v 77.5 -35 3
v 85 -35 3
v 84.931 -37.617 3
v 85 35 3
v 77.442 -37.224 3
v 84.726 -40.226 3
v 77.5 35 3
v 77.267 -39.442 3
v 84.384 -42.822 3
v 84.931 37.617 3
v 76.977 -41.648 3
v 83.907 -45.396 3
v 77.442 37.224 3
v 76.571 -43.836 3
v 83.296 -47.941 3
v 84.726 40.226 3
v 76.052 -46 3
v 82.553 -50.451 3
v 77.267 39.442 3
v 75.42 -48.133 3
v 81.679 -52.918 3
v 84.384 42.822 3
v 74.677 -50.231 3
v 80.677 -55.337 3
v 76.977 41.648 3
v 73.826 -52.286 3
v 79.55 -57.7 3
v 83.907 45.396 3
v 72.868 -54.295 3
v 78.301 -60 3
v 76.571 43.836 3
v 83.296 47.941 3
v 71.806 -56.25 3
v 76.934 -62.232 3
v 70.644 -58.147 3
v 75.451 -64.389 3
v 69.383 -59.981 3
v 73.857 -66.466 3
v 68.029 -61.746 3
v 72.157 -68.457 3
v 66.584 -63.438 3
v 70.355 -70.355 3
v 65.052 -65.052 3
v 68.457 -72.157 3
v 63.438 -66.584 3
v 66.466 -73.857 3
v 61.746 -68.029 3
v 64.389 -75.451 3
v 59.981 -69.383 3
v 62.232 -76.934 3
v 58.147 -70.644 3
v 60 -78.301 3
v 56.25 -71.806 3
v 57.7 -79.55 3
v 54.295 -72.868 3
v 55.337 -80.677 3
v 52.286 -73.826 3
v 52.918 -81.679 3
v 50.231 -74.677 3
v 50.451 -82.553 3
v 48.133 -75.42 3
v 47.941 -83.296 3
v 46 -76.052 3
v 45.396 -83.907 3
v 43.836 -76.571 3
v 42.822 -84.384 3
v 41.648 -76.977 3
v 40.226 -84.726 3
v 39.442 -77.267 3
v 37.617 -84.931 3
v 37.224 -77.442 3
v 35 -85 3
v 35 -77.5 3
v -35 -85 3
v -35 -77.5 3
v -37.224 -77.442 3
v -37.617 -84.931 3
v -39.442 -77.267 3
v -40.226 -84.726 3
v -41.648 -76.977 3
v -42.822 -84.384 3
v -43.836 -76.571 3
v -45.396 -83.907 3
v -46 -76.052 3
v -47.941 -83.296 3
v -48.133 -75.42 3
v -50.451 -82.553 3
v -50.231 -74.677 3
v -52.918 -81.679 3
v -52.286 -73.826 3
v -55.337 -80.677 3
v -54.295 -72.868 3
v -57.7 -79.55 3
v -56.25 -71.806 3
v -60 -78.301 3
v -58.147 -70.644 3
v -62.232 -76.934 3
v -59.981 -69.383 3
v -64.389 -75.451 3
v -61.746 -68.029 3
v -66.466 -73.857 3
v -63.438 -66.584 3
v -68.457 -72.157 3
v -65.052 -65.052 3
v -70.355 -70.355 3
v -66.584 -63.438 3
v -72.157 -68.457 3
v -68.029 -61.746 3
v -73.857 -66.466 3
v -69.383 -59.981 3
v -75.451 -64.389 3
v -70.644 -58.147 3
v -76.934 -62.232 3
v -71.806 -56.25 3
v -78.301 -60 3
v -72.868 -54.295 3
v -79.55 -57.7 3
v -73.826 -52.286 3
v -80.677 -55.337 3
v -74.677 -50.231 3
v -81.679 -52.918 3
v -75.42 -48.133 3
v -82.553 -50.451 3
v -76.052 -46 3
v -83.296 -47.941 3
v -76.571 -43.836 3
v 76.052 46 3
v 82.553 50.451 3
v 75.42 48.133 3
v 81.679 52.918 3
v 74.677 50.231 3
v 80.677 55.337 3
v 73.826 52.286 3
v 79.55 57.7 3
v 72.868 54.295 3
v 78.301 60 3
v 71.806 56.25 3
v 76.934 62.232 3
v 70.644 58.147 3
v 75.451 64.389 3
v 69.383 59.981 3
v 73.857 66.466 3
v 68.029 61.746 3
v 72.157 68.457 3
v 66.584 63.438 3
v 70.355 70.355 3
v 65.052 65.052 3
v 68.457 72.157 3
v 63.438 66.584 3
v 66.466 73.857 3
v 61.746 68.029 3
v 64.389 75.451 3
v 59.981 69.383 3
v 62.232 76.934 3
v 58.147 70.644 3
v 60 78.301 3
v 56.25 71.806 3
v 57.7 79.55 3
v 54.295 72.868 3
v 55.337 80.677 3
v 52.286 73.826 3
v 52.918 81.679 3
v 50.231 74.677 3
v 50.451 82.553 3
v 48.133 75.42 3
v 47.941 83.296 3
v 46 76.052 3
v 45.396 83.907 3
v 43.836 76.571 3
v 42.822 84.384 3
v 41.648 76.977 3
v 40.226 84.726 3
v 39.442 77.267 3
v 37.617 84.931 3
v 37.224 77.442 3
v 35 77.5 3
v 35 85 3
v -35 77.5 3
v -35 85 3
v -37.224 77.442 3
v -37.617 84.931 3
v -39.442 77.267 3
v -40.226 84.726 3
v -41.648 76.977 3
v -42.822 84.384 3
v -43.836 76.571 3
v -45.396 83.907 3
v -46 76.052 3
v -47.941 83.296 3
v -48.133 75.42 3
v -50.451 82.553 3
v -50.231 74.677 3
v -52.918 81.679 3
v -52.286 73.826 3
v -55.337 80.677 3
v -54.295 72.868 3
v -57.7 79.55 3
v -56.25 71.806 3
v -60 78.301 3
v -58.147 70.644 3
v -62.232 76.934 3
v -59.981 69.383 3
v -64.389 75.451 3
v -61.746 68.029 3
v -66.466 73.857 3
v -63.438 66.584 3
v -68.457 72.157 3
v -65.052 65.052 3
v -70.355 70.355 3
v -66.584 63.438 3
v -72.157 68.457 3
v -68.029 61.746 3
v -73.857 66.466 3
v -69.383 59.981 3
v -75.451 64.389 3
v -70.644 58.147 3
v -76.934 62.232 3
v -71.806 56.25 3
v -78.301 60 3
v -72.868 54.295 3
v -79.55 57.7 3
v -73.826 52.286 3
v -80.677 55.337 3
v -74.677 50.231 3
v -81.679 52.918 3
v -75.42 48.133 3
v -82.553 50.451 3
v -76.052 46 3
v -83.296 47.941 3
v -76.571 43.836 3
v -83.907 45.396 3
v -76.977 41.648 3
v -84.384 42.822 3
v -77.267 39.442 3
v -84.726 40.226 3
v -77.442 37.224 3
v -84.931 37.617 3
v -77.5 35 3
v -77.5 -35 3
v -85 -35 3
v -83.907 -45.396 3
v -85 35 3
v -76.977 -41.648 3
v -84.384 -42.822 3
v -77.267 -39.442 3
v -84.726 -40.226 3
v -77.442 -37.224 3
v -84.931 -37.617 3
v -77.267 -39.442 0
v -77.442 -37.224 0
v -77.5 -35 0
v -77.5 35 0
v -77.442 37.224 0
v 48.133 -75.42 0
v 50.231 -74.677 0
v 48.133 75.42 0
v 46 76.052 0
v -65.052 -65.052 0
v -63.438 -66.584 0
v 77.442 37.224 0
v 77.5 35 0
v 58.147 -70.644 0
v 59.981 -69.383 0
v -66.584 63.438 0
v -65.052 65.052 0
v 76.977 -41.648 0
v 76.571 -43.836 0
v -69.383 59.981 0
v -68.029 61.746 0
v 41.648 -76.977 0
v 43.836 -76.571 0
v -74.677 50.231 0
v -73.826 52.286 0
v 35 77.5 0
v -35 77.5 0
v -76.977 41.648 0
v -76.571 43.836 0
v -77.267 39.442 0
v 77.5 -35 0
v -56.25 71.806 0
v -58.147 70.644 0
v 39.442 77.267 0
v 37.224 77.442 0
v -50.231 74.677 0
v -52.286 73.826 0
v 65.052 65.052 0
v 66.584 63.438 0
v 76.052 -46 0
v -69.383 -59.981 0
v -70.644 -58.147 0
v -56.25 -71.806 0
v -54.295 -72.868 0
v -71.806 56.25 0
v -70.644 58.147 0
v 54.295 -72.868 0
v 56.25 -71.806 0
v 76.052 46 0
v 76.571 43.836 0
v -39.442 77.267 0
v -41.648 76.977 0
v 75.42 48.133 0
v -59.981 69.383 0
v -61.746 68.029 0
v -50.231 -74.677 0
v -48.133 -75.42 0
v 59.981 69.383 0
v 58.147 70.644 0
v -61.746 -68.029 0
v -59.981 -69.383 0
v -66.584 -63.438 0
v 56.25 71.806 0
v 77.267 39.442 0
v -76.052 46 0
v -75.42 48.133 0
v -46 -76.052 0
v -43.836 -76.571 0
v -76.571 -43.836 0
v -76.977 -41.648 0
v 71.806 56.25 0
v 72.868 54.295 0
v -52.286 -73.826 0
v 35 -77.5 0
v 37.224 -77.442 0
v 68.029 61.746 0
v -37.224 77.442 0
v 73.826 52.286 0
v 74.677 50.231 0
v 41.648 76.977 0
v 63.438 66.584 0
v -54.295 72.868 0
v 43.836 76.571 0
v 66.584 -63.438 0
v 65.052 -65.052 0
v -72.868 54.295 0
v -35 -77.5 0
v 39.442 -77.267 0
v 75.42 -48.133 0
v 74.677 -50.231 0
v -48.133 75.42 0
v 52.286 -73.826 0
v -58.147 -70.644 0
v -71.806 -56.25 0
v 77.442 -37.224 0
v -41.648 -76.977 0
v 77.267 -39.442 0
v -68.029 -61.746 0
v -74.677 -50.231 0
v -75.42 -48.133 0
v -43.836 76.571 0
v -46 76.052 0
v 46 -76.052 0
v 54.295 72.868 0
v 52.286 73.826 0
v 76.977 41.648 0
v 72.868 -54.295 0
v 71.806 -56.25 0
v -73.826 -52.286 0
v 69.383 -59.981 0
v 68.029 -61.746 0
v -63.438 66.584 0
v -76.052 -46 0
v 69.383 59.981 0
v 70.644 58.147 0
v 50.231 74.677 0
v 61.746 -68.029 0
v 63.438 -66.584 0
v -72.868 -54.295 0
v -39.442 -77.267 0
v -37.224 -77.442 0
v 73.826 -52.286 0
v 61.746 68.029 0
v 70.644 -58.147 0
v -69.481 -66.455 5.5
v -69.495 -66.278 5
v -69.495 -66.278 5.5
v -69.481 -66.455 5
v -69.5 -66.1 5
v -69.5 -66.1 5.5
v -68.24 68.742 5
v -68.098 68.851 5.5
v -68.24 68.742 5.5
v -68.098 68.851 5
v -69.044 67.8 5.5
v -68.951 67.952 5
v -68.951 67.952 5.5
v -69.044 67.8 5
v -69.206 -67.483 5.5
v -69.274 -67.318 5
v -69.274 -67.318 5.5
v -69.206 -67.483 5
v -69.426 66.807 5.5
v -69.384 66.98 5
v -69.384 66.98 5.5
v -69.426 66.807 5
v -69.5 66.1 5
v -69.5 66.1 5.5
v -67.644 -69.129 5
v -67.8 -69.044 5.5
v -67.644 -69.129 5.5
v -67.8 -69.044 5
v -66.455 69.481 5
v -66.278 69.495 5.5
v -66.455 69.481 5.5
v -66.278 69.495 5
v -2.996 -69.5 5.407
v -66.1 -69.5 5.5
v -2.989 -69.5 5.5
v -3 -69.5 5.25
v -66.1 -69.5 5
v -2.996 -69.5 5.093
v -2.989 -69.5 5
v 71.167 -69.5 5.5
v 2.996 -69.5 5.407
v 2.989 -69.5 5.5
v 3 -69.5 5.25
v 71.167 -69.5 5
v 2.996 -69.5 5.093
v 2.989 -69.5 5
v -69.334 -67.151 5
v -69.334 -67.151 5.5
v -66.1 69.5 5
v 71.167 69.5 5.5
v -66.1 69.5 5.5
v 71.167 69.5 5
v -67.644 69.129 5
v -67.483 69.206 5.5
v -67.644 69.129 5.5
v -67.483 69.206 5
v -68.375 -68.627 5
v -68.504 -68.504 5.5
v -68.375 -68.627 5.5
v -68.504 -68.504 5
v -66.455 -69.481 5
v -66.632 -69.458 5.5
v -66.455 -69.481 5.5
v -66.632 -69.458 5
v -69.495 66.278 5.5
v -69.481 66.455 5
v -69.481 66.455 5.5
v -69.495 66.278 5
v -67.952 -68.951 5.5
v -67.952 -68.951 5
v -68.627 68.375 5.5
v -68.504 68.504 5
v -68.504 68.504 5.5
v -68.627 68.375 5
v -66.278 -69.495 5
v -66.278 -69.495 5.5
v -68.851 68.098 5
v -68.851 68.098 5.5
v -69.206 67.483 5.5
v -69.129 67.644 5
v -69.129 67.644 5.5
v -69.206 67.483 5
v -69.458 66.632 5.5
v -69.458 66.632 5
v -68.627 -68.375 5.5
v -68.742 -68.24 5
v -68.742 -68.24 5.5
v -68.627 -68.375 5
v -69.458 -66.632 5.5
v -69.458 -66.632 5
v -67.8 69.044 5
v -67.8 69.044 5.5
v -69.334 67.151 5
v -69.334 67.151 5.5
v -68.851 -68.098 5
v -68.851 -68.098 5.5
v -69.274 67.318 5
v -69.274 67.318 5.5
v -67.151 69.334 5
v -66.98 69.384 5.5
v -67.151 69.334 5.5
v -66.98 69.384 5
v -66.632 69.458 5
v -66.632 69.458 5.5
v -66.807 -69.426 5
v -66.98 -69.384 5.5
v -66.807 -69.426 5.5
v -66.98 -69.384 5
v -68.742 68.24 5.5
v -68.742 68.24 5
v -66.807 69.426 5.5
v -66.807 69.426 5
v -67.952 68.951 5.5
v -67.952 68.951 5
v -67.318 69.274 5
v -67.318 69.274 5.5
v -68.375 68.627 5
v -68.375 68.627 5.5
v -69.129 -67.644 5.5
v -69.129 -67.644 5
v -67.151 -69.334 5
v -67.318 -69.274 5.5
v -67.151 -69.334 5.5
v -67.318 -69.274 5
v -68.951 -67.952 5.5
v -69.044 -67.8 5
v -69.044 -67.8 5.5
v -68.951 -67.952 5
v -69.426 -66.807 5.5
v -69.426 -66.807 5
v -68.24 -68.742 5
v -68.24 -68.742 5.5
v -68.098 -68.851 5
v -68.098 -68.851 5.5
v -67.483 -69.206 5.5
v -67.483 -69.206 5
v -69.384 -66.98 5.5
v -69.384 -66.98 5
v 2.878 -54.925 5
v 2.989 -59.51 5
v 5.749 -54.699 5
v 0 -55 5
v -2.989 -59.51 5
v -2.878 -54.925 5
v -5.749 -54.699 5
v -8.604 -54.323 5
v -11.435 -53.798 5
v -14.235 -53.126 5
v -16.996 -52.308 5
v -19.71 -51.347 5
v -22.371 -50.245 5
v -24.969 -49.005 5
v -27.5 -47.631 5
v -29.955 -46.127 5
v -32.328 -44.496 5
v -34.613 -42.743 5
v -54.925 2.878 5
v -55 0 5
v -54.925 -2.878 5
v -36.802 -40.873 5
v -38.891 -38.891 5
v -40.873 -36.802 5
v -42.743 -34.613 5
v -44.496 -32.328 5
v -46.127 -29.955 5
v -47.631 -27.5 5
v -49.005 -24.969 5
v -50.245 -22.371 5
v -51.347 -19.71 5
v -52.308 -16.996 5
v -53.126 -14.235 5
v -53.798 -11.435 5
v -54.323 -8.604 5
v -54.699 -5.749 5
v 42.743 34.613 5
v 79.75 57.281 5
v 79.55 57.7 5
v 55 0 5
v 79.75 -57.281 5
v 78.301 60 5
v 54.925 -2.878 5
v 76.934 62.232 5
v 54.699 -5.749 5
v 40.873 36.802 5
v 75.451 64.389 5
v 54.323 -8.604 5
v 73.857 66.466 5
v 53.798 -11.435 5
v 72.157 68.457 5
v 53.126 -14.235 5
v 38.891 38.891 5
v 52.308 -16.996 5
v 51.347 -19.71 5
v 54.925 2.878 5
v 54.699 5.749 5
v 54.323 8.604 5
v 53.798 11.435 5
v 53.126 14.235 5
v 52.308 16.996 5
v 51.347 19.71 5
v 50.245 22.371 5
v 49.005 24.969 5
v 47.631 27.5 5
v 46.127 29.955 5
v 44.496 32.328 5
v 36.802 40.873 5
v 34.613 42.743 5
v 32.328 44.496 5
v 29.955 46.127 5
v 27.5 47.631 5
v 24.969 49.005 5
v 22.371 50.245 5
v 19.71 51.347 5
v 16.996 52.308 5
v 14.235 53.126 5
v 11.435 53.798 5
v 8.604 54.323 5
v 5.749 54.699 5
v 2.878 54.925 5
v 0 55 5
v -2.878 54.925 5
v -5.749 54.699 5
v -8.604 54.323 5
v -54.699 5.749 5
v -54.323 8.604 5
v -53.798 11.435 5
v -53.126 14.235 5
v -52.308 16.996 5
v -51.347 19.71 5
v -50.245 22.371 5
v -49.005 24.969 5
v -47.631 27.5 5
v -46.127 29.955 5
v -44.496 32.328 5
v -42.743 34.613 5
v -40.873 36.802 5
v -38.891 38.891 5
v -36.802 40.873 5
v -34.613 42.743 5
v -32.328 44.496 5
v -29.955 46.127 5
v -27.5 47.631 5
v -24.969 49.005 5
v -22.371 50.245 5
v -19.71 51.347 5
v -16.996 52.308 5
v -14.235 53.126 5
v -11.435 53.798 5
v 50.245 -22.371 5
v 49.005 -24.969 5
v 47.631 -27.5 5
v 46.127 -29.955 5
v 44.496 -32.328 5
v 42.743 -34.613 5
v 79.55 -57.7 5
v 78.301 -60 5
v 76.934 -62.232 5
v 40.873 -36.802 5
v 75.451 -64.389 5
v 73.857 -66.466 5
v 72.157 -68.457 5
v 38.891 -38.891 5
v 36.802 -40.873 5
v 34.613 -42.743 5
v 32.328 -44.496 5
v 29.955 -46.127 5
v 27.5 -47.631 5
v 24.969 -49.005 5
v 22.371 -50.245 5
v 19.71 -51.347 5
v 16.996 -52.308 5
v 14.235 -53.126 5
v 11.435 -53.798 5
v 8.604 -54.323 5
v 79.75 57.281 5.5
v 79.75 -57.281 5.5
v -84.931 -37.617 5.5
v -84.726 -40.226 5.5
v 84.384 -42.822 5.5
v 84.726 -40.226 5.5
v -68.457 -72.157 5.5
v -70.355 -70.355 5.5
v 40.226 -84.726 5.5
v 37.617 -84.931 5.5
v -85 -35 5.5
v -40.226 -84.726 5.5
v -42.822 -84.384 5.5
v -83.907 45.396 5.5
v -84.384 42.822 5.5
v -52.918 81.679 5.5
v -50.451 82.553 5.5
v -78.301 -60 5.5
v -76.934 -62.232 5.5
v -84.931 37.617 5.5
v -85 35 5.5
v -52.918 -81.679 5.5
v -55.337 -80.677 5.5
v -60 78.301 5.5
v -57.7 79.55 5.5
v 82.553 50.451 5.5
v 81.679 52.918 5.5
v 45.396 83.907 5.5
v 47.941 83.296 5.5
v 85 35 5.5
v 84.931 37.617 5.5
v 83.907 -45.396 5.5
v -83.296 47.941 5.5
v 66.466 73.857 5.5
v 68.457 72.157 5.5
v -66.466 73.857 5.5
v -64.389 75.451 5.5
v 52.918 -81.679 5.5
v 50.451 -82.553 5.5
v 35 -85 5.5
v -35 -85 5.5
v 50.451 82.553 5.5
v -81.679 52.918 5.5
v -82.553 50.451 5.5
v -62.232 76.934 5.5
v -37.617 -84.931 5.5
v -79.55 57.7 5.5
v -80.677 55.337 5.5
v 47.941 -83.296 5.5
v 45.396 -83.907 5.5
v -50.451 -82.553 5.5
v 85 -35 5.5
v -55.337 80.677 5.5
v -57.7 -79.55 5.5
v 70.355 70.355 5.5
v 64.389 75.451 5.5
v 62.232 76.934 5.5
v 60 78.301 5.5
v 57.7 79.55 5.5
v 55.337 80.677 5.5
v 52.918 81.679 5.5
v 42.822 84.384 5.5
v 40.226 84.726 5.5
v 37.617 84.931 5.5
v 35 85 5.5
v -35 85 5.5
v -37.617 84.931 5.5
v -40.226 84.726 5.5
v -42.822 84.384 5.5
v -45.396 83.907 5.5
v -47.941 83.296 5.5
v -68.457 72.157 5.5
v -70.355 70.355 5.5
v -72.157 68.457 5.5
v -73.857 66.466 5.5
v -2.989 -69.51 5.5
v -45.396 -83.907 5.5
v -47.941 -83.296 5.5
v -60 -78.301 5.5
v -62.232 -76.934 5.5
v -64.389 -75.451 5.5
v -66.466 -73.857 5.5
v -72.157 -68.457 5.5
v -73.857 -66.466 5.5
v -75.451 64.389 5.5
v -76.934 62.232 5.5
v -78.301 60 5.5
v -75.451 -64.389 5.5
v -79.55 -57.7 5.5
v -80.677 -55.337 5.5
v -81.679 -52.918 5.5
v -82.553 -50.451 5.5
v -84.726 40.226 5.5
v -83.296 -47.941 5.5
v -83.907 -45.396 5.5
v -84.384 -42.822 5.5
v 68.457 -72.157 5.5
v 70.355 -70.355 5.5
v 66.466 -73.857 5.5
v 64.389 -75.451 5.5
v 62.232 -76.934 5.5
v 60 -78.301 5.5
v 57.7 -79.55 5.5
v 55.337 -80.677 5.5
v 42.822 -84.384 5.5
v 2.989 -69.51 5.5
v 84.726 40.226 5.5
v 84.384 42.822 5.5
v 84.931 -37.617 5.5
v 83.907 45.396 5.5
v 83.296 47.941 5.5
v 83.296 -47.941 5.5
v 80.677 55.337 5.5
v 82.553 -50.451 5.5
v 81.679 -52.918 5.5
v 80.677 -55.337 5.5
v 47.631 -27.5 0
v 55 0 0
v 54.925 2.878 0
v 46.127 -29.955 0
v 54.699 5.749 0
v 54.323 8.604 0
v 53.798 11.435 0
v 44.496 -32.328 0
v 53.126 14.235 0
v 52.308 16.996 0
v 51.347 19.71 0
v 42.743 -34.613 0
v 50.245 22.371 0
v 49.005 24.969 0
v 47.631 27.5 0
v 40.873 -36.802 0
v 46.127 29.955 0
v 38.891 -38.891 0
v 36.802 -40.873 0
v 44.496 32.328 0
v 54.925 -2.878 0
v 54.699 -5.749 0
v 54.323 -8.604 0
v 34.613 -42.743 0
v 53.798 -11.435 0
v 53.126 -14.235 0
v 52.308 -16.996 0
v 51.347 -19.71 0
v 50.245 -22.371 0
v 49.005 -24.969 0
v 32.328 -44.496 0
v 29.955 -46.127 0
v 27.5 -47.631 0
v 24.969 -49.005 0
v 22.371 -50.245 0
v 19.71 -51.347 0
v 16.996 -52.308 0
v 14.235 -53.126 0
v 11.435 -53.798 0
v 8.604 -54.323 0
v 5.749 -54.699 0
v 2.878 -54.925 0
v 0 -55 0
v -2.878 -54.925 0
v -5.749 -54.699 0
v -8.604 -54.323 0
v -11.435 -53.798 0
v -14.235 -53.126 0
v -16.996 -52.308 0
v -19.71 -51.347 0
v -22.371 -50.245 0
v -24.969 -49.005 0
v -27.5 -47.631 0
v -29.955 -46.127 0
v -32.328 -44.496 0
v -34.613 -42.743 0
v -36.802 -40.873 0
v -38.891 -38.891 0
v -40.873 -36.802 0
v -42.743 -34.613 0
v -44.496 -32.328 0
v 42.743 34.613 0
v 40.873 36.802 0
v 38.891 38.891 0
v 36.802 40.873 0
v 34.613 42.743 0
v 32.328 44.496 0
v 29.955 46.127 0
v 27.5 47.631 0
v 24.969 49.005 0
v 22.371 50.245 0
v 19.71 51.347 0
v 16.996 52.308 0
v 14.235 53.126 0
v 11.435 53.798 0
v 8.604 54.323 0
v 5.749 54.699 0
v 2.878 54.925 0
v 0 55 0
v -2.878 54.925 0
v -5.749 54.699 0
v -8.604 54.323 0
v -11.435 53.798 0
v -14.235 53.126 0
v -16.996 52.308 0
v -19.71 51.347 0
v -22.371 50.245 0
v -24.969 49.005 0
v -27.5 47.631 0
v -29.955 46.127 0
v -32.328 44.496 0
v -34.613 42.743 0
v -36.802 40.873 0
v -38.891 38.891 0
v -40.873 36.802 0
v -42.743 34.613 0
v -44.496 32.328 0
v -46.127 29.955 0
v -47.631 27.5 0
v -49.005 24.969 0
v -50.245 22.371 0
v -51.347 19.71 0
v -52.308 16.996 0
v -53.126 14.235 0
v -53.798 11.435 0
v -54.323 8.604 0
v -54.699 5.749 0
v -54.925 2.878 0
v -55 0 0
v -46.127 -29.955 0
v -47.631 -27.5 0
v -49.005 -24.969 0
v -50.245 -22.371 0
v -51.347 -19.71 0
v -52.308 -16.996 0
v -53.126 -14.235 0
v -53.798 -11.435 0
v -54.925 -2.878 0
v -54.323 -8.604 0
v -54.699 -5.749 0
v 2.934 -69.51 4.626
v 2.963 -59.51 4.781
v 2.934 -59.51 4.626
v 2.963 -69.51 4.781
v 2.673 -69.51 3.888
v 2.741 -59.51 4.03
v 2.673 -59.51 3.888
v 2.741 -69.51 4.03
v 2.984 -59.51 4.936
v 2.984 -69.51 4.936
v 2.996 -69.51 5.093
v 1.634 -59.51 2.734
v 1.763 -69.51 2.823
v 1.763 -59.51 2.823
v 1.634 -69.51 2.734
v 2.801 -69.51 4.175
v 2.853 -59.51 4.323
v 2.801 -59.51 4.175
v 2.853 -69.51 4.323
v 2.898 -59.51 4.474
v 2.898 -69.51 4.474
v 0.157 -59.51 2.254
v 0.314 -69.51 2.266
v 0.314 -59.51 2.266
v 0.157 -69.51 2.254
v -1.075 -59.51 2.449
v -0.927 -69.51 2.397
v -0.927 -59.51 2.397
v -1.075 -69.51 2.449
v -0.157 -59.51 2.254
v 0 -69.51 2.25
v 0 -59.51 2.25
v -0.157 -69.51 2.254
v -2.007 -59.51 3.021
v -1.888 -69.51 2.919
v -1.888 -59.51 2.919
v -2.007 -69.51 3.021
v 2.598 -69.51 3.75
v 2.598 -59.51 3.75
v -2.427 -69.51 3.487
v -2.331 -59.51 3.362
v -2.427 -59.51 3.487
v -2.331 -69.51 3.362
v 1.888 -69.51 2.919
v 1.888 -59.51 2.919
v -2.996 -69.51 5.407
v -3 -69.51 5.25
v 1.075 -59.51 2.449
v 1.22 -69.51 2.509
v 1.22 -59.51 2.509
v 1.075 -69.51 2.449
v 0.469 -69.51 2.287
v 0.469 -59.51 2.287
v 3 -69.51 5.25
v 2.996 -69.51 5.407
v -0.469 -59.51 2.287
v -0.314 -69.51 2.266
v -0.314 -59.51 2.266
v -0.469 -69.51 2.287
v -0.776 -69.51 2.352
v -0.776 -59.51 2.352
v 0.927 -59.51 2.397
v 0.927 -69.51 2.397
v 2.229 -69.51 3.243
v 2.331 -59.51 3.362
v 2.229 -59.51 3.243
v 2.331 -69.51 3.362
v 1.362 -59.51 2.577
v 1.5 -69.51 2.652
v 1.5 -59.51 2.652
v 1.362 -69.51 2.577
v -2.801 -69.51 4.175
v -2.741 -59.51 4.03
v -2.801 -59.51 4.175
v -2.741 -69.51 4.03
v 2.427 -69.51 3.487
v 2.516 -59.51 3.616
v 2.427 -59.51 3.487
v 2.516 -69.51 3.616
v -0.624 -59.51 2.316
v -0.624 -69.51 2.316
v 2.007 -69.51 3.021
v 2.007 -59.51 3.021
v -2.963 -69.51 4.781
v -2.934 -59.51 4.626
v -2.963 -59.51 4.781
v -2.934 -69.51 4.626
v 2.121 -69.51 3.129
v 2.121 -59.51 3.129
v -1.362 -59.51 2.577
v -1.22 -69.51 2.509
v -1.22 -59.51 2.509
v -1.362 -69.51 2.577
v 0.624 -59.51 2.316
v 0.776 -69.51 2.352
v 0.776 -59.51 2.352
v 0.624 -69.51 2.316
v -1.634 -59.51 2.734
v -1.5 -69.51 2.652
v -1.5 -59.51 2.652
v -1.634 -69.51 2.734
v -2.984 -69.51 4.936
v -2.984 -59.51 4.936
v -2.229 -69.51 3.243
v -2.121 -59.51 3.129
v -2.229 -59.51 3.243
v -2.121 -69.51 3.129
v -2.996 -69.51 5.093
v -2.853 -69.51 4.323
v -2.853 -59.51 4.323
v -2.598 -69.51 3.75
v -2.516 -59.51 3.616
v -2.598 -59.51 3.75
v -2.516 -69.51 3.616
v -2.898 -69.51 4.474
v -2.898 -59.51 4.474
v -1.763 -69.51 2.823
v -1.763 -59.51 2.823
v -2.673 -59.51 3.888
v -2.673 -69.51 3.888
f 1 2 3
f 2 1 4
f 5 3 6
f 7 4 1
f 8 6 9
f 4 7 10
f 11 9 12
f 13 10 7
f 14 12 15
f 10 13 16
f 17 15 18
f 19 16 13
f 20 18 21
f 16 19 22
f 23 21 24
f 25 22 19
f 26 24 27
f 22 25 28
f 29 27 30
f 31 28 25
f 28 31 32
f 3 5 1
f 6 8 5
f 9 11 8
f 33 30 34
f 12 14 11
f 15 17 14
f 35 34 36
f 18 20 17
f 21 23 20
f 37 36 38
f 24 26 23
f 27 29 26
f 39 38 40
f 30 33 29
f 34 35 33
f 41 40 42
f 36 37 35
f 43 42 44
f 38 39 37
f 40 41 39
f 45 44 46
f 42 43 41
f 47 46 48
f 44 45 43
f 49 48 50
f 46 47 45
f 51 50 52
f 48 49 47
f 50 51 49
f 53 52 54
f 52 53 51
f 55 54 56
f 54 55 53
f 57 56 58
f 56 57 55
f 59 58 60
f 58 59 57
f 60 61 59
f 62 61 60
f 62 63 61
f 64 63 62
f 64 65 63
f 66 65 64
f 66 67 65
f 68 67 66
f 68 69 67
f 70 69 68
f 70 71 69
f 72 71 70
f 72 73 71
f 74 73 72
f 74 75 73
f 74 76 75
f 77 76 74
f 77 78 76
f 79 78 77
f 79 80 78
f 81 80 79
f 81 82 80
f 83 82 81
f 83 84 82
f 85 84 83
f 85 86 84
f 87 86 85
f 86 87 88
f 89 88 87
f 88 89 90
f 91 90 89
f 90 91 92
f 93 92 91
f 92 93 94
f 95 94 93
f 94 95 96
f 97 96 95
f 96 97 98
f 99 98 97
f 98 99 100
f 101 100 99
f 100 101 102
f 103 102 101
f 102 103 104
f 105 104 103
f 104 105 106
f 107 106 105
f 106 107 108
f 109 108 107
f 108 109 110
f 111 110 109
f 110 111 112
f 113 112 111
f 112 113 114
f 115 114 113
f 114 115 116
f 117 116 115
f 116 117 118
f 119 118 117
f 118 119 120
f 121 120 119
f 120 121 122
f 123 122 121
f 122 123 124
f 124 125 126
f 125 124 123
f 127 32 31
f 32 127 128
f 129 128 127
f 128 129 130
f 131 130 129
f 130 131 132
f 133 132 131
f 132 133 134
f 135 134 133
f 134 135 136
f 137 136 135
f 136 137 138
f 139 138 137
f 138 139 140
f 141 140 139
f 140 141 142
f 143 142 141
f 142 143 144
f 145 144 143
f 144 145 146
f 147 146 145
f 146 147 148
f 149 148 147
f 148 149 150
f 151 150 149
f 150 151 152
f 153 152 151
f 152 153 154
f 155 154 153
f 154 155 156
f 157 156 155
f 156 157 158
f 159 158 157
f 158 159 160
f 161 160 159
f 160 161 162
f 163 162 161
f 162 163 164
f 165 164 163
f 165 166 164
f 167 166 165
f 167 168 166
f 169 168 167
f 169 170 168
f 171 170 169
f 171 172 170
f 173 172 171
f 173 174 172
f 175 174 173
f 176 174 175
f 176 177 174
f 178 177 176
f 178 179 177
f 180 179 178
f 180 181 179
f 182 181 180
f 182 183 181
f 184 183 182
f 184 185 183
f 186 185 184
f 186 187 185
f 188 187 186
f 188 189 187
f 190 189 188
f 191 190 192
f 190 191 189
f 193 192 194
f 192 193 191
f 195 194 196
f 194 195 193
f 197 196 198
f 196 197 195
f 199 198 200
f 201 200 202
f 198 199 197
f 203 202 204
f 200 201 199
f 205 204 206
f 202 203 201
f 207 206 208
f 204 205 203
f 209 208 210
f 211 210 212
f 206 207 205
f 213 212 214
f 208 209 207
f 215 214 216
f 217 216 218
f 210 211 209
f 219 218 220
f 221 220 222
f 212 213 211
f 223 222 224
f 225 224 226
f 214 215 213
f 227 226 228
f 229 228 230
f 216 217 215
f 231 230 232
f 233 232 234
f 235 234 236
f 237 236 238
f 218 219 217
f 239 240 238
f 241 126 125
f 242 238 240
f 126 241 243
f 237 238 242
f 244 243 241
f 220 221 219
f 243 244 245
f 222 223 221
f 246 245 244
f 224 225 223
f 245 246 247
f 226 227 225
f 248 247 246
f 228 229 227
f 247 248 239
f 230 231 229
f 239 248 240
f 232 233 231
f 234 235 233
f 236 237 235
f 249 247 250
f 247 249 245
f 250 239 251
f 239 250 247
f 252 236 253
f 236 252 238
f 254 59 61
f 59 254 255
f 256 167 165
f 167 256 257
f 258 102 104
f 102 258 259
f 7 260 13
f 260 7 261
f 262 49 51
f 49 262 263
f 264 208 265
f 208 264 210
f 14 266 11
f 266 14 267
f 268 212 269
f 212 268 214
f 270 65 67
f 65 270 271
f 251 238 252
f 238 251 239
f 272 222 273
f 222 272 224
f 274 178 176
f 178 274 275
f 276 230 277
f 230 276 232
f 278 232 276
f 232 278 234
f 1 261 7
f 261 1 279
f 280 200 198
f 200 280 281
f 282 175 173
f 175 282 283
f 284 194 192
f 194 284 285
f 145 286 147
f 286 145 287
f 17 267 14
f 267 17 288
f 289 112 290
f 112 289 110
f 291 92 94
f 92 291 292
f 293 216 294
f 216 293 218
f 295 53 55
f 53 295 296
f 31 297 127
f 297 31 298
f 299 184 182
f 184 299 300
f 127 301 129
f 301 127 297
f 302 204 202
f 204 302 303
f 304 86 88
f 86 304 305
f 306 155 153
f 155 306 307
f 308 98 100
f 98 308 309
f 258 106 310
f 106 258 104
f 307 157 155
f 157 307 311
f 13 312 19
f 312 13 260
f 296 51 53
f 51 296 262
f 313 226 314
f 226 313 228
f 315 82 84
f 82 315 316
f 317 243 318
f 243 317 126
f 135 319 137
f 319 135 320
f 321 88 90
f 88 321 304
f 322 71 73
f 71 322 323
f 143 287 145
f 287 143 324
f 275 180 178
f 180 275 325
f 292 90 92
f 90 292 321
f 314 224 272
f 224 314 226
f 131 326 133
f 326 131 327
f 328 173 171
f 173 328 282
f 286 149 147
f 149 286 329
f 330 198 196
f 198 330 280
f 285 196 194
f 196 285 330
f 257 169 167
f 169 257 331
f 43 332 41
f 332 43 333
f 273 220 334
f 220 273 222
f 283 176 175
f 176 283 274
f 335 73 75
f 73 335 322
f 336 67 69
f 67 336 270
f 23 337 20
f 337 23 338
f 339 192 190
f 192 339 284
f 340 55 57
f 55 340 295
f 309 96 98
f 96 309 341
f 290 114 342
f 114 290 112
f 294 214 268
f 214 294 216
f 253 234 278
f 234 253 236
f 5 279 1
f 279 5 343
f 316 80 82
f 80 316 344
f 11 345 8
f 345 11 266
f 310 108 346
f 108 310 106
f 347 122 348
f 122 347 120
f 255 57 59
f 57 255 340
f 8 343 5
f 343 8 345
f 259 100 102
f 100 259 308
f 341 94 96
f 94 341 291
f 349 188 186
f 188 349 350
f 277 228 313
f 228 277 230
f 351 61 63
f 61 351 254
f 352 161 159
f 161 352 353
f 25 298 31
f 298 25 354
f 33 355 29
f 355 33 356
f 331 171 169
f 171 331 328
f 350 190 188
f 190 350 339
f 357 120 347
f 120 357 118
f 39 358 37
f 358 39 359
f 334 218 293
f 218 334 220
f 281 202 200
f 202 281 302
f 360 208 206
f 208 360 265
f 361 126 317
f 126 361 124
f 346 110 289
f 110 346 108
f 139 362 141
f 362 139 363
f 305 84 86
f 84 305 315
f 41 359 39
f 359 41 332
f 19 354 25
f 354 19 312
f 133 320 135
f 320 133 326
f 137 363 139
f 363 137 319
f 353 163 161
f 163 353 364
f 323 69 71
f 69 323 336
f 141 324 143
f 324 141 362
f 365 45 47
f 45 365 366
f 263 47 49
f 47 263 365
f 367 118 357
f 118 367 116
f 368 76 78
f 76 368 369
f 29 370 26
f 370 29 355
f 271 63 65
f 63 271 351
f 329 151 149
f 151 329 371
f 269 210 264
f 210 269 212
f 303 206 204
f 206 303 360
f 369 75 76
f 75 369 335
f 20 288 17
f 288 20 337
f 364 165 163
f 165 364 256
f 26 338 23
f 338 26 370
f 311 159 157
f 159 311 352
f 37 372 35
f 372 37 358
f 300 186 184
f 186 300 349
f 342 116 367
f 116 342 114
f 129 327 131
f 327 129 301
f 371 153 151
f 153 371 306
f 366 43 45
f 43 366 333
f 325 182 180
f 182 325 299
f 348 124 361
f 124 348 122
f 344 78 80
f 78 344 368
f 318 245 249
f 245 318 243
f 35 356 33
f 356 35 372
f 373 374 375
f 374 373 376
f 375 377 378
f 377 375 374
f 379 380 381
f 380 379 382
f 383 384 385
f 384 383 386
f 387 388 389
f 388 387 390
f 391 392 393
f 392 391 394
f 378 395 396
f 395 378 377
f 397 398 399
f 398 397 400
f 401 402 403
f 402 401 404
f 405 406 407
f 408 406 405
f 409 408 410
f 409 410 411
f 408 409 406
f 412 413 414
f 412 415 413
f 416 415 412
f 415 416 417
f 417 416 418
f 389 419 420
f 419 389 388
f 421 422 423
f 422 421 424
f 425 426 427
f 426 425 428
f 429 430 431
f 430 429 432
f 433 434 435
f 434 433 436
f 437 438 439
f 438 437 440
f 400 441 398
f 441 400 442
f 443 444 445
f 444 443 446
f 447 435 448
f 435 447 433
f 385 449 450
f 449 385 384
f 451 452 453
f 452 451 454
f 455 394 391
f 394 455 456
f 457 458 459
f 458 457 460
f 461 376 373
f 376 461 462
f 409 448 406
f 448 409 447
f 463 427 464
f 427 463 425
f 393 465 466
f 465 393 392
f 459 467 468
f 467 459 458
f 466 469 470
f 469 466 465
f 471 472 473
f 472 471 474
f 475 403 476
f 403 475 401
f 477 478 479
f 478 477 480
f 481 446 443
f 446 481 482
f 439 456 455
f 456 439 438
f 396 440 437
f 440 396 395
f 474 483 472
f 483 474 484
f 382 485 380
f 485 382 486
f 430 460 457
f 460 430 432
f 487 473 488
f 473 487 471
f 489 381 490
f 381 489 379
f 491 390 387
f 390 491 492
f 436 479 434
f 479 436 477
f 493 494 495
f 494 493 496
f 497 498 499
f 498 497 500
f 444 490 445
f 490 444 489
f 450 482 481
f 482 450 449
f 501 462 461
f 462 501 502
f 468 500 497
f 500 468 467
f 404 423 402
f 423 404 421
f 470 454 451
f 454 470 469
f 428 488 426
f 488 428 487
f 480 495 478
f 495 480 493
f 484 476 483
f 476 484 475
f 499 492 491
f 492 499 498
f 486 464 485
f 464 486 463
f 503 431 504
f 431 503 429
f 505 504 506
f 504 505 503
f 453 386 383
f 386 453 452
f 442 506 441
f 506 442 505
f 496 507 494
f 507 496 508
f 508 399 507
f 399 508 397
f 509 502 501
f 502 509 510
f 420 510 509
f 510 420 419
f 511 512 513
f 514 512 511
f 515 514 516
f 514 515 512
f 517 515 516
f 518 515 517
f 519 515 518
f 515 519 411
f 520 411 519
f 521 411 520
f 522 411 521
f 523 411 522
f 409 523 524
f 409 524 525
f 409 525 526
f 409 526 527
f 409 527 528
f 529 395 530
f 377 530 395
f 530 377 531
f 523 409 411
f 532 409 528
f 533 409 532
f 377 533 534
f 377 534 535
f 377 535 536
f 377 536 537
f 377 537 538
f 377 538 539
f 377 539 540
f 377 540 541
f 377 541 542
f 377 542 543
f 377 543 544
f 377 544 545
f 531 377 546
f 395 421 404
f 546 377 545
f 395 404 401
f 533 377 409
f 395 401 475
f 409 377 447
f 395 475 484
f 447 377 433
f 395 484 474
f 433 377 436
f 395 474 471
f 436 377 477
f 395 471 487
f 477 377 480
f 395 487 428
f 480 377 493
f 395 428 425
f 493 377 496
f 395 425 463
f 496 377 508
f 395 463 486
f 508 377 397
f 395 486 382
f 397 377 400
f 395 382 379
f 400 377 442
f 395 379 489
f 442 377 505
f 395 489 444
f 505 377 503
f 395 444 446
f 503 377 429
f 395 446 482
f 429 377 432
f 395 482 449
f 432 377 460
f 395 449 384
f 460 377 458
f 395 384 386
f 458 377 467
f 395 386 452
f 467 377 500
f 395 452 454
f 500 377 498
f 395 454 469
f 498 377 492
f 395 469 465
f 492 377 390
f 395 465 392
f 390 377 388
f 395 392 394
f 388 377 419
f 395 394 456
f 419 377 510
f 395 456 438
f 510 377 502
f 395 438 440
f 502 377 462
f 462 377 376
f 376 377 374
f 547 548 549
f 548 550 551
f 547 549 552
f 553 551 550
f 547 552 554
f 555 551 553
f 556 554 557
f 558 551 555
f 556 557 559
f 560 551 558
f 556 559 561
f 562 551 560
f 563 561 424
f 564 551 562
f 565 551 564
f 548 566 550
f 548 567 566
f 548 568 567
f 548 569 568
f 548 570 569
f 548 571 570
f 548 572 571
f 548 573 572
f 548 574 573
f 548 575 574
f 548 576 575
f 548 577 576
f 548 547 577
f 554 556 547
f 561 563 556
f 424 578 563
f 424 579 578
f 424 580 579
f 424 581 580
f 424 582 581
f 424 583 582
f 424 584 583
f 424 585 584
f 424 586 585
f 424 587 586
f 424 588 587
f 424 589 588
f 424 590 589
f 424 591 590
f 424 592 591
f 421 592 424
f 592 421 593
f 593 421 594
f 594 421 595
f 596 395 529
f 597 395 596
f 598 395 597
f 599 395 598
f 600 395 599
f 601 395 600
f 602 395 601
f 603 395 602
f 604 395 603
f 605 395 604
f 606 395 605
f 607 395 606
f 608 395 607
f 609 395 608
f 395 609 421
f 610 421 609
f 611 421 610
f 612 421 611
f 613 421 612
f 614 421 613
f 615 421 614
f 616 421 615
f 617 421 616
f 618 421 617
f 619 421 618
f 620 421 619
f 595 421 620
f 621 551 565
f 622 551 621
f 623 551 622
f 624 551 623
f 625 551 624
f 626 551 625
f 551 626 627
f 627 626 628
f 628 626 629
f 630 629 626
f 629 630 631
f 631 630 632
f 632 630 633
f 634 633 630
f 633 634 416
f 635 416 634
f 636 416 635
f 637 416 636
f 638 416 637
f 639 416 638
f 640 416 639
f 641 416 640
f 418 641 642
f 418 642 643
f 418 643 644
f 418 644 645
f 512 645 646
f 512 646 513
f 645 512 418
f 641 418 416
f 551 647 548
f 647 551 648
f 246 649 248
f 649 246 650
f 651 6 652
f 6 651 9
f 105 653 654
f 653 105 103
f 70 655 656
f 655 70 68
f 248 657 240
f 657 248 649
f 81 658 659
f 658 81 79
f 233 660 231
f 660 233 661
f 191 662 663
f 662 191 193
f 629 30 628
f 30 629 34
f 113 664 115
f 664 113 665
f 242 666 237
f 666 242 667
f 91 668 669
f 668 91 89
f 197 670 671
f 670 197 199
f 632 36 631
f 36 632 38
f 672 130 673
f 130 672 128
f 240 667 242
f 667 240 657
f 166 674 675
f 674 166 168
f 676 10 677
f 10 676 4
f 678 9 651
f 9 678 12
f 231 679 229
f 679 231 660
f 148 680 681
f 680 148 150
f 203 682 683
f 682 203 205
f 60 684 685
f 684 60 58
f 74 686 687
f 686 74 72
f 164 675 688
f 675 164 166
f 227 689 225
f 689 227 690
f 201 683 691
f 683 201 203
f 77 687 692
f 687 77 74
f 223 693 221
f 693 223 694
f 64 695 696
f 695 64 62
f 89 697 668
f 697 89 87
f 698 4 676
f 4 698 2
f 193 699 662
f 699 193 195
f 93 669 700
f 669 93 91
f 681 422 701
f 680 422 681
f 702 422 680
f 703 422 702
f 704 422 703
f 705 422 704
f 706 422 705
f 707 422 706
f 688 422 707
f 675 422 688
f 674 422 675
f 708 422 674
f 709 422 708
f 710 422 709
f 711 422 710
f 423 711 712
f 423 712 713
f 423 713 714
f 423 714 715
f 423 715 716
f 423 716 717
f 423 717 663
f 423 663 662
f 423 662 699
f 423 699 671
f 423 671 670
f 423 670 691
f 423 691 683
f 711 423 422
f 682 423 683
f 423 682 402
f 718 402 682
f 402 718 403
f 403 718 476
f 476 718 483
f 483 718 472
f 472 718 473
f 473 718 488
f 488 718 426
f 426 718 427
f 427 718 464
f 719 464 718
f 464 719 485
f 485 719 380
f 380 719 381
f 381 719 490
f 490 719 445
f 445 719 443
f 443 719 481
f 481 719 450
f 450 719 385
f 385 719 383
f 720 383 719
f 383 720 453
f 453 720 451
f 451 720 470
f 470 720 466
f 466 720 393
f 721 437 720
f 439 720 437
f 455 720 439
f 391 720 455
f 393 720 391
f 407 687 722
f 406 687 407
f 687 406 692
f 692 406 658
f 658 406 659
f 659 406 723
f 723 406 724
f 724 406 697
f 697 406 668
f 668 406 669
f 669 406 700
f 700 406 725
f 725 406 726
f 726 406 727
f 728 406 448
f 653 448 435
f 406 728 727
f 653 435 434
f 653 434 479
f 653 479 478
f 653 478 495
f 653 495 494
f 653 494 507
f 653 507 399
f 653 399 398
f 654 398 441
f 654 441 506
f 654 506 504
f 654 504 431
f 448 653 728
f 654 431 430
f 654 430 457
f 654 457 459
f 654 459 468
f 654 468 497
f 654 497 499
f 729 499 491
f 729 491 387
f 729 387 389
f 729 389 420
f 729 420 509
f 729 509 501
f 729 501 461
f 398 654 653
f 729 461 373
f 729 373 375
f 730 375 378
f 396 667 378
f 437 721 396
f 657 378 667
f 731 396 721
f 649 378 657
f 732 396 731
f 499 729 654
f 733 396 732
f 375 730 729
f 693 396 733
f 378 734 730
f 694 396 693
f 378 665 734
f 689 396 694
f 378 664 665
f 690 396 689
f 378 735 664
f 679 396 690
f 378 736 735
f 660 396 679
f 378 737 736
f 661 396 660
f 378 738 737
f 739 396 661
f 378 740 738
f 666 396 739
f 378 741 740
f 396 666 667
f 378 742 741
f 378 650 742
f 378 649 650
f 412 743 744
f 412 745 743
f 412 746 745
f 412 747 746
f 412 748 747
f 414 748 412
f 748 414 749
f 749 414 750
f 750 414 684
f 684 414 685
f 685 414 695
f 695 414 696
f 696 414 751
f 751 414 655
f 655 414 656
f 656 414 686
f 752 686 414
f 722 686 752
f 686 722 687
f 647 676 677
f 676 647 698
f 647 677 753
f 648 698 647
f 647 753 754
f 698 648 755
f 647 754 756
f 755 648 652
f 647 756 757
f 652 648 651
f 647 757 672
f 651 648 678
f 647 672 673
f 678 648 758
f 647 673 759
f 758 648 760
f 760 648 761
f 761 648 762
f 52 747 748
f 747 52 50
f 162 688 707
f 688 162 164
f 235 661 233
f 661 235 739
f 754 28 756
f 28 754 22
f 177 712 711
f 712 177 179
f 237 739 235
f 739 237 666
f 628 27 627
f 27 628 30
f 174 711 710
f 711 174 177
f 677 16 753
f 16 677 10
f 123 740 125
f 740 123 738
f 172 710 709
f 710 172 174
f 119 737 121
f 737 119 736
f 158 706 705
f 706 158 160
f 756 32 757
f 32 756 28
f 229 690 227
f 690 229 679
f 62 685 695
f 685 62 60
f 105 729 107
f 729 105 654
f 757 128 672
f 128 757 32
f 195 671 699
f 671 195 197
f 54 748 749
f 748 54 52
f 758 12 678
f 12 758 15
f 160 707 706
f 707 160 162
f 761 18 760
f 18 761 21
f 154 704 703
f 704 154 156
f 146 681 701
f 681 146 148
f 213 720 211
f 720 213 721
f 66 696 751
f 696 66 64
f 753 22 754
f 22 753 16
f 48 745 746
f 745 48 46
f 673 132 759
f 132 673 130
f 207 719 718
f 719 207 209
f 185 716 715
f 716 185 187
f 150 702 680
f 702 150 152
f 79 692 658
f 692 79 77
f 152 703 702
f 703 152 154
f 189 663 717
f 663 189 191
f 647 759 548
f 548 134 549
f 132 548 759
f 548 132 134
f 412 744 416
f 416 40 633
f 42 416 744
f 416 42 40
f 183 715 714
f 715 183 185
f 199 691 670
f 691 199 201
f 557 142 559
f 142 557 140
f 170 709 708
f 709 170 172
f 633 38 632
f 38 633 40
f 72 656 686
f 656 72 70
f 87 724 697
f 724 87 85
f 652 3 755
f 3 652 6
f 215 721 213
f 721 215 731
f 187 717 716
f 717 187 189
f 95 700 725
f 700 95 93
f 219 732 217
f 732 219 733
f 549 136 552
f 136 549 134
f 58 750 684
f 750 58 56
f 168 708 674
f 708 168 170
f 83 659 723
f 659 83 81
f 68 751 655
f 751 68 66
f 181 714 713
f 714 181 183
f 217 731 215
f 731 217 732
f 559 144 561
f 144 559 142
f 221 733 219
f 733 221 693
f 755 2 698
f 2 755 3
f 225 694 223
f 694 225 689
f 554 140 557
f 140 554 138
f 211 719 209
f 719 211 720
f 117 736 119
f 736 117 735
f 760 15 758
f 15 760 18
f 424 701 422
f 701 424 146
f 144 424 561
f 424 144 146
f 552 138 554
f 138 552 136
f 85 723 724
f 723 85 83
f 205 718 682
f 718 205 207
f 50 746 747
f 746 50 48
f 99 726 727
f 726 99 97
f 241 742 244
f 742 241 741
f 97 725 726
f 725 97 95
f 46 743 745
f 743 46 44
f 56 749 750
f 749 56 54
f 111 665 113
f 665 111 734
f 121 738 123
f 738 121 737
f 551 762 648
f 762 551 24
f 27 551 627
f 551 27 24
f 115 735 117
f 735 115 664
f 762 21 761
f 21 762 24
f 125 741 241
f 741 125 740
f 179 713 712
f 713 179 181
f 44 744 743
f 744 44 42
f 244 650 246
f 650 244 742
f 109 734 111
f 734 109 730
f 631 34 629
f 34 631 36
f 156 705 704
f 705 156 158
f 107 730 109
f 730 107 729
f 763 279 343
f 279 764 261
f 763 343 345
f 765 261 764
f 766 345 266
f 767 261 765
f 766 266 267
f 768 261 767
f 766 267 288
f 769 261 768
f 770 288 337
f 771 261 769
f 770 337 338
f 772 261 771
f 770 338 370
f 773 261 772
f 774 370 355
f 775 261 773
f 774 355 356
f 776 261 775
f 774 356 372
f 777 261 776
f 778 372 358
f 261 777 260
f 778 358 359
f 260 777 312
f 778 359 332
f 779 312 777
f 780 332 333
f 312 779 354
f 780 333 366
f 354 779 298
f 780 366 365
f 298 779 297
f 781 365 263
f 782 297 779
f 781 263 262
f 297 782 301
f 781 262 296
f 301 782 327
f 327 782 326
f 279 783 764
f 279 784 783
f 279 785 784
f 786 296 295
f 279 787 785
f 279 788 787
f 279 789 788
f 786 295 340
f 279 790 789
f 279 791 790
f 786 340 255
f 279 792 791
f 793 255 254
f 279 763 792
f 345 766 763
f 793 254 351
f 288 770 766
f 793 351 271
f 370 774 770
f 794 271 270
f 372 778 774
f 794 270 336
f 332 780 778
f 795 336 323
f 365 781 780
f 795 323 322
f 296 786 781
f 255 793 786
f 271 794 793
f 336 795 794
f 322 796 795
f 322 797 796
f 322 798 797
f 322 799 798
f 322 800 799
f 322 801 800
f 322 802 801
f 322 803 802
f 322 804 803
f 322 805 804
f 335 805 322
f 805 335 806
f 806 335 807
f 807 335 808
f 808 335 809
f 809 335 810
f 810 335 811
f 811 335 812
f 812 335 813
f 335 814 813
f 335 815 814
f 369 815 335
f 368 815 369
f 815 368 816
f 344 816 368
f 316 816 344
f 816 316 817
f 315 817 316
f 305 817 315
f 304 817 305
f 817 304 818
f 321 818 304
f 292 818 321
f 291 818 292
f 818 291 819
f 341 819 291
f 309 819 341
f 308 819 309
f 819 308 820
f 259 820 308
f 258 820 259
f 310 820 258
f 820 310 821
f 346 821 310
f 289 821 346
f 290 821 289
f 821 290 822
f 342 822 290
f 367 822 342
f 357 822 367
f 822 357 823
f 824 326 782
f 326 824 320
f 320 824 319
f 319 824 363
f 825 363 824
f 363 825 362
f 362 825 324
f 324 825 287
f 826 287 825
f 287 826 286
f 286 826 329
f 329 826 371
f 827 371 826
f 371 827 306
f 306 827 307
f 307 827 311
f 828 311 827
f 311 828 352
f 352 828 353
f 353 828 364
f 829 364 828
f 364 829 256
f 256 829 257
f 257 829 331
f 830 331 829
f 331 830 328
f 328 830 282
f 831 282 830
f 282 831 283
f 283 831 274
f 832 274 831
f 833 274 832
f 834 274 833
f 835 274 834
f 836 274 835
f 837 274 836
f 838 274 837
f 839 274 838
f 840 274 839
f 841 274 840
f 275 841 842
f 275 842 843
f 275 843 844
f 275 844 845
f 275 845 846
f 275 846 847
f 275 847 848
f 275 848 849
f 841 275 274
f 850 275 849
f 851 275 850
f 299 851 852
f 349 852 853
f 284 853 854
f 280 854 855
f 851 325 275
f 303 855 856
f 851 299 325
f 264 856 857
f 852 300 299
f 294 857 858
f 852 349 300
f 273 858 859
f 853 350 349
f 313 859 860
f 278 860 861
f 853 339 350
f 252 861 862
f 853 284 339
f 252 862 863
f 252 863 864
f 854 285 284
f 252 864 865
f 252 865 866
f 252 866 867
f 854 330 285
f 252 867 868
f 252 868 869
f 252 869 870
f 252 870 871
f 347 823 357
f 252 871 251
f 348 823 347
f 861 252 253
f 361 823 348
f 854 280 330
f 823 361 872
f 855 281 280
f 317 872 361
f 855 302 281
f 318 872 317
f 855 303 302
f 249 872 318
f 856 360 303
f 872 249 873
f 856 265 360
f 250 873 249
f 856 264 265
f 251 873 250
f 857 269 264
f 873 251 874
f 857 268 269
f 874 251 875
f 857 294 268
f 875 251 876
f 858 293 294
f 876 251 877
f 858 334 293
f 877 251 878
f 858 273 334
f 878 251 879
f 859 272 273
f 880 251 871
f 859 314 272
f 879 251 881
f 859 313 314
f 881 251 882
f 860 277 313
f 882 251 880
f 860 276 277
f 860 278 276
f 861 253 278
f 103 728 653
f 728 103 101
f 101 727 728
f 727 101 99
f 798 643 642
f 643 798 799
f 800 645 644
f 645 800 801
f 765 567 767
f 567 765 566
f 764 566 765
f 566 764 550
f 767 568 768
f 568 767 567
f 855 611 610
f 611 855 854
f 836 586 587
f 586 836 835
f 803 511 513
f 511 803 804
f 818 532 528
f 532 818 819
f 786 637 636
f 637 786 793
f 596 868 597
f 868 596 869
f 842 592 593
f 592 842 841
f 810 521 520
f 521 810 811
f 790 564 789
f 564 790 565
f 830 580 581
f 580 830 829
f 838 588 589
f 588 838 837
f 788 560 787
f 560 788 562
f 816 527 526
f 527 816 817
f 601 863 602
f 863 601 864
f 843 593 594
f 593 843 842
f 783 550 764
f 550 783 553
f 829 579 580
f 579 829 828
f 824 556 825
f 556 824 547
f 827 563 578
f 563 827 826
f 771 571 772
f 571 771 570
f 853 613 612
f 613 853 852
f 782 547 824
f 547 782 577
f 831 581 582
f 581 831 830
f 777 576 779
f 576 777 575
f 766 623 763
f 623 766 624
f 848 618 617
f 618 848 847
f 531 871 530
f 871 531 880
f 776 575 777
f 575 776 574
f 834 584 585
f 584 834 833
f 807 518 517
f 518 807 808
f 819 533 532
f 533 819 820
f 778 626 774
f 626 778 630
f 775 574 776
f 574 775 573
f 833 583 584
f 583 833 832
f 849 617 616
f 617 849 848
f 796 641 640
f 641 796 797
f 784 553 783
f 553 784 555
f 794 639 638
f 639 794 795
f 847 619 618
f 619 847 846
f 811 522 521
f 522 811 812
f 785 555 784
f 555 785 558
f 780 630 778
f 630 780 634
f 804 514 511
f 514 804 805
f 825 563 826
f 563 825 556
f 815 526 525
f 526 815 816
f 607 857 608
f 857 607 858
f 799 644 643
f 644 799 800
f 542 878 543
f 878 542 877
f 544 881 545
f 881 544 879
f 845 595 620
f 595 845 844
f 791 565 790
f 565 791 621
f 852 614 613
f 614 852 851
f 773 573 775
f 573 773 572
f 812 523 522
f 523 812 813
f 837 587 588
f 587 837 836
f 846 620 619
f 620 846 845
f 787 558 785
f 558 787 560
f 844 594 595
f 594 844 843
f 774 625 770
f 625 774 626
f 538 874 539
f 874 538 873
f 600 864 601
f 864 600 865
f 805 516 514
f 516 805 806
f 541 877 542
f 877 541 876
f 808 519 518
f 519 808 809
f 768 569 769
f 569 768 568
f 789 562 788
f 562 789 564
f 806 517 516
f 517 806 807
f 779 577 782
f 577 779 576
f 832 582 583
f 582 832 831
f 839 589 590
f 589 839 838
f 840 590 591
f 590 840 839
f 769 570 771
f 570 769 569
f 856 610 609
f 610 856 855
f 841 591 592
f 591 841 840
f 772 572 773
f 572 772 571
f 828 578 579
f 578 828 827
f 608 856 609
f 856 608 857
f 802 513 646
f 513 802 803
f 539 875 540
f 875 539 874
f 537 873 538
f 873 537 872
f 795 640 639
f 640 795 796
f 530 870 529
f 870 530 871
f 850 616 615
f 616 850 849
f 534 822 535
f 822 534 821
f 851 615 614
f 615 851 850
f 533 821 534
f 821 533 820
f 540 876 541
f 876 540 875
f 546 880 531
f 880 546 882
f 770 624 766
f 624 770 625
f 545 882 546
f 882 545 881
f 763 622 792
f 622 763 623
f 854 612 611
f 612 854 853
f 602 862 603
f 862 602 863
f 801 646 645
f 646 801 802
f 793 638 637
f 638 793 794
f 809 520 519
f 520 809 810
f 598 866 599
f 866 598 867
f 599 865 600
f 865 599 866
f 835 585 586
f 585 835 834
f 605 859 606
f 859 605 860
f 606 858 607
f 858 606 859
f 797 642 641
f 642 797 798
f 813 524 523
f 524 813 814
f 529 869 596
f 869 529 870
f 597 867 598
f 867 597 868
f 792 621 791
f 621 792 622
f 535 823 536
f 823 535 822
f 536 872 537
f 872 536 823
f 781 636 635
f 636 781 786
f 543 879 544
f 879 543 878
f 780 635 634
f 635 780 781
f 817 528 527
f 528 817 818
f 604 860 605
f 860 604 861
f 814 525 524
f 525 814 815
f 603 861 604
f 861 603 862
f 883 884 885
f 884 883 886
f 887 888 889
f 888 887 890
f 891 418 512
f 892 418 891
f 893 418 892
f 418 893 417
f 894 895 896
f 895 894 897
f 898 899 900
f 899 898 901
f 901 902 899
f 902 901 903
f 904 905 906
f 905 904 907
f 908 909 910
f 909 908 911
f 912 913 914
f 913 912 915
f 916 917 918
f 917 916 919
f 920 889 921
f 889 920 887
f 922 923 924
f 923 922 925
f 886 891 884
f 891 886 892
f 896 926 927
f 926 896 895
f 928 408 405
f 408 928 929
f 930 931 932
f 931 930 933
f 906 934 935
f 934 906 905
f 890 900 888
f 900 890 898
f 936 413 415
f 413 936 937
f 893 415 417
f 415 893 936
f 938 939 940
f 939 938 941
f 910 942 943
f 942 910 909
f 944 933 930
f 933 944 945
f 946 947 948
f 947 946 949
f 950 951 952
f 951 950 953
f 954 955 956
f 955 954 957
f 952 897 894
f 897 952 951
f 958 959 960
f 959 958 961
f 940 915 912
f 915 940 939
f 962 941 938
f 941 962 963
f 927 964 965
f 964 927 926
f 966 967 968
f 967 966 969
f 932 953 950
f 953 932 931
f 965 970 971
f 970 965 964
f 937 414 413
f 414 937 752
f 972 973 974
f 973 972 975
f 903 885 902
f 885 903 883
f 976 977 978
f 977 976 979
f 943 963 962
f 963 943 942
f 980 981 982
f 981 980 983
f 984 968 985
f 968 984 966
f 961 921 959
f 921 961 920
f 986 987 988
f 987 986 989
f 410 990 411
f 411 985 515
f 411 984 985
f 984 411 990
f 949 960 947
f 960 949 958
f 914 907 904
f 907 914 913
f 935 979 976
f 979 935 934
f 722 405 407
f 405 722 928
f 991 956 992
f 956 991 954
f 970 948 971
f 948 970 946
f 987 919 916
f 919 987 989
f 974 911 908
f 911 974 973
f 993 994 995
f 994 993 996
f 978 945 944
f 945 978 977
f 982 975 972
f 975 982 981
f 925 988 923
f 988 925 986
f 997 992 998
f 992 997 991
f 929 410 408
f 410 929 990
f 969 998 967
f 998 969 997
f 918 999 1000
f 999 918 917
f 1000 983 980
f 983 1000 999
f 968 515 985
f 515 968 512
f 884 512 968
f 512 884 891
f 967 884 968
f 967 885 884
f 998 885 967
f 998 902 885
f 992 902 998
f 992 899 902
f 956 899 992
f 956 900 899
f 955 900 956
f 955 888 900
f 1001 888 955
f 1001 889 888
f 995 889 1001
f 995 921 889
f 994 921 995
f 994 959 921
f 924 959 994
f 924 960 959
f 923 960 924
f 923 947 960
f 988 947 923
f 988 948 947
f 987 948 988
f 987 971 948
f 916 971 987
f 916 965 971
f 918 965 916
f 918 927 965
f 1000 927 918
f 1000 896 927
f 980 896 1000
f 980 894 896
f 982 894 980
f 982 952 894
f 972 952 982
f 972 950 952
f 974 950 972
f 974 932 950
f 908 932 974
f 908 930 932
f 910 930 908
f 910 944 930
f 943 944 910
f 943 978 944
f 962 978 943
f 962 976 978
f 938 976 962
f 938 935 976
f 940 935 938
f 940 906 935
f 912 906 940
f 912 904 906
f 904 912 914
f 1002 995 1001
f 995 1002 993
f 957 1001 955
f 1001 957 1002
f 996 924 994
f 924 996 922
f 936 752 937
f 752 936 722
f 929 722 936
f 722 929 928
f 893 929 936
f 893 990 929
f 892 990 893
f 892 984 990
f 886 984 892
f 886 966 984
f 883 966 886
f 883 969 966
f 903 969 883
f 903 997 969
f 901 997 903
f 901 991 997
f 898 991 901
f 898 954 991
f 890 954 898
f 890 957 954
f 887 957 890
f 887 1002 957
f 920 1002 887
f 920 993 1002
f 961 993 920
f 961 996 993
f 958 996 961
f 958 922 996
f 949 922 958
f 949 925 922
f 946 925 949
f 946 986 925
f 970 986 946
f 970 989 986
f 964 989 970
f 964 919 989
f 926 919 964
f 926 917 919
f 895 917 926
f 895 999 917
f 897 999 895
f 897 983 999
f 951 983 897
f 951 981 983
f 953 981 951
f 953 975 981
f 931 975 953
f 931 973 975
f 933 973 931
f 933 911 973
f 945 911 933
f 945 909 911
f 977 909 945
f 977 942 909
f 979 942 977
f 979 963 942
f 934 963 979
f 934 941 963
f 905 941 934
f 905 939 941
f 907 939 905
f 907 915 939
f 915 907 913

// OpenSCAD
// Fatif DS 20x25 Adapter Lensboard
// Accepts 138.5mm Gowland 8x10 lensboards via horizontal slide
// 
// Design: Terry Moore / Claude
// Date: 2026-02-07
// Material: 6061-T6 aluminum, machined from 6mm stock
// All dimensions in mm
//
// Orientation:
//   Back face (camera side) at z=0
//   Front face (lens side) at z=5.5
//   Board slides in from +X direction
//   Fixed stop on -X side
//   Ball plunger on -Y side wall

$fn = 120;  // smooth curves for rendering

// === PARAMETERS ===

// Outer board profile
board_size = 170;           // overall square dimension
board_corner_r = 50;        // corner radius
board_thickness = 5.5;      // total thickness (face 6mm stock to this)

// Back perimeter step (seats into Fatif front standard)
step_width = 7.5;           // width of step from outer edge
step_depth = 3.0;           // depth milled from back face
// Inner profile of step:
step_inner_size = board_size - 2*step_width;  // 155mm
step_inner_r = board_corner_r - step_width;   // 42.5mm

// Front recess for Gowland board
gowland_size = 139.0;      // 138.5 nominal + 0.5mm clearance
gowland_corner_r = 3.4;    // corner radius of Gowland boards
recess_depth = 0.5;         // depth of recess from front face

// Through hole
bore_dia = 110;             // diameter of central bore

// Ball plunger (M6 x 1.0 thread, typical)
// Located in -Y wall of recess, centered on slide axis
plunger_thread_dia = 6.0;   // M6
plunger_depth = 10.0;       // depth of tapped hole
// Position: centered on X axis, in the -Y wall of the recess
plunger_y = -gowland_size/2;
plunger_z = board_thickness - recess_depth/2;  // centered in recess wall height

// Slide opening extension
// The recess extends to the outer profile on the +X side
slide_opening_extension = (board_size - gowland_size)/2 + 5; // extend past board edge

// === MODULES ===

module rounded_rect_2d(w, h, r) {
    hull() {
        translate([ w/2-r,  h/2-r]) circle(r=r);
        translate([-w/2+r,  h/2-r]) circle(r=r);
        translate([-w/2+r, -h/2+r]) circle(r=r);
        translate([ w/2-r, -h/2+r]) circle(r=r);
    }
}

module rounded_rect(w, h, r, height) {
    linear_extrude(height)
    rounded_rect_2d(w, h, r);
}

// === MAIN BODY ===

difference() {
    // 1. Start with full-thickness board
    rounded_rect(board_size, board_size, board_corner_r, board_thickness);

    // 2. Back perimeter step: remove 3mm from back face in the outer ring
    //    We subtract the inner (raised) area from a full-depth cut of the outer area
    translate([0, 0, -0.01])
    difference() {
        rounded_rect(board_size + 1, board_size + 1, board_corner_r, step_depth + 0.01);
        translate([0, 0, -0.1])
        rounded_rect(step_inner_size, step_inner_size, step_inner_r, step_depth + 0.2);
    }

    // 3. Front recess for Gowland board
    //    Pocket is 0.5mm deep from front face
    //    Open on +X side for slide entry
    translate([0, 0, board_thickness - recess_depth])
    union() {
        // Main recess pocket
        linear_extrude(recess_depth + 0.01)
        rounded_rect_2d(gowland_size, gowland_size, gowland_corner_r);

        // Slide opening: extend recess to +X edge of board
        // This is a rectangular extension from the recess to the board edge
        translate([gowland_size/4, 0, 0])
        linear_extrude(recess_depth + 0.01)
        square([gowland_size/2 + slide_opening_extension, gowland_size], center=true);
    }

    // 4. Central through-bore
    translate([0, 0, -0.01])
    cylinder(d=bore_dia, h=board_thickness + 0.02);

    // 5. Ball plunger tapped hole (M6)
    //    In the -Y wall of the recess, horizontal, pointing +Y
    //    Positioned at X=0 (centered on slide axis)
    translate([0, plunger_y - 0.01, plunger_z])
    rotate([-90, 0, 0])
    cylinder(d=plunger_thread_dia, h=plunger_depth);
}

// === ANNOTATIONS (for reference, disable for export) ===
// Uncomment to see Gowland board ghost:
// %translate([0, 0, board_thickness - recess_depth])
//   color("blue", 0.3)
//   rounded_rect(138.5, 138.5, 3.4, 1.6);
